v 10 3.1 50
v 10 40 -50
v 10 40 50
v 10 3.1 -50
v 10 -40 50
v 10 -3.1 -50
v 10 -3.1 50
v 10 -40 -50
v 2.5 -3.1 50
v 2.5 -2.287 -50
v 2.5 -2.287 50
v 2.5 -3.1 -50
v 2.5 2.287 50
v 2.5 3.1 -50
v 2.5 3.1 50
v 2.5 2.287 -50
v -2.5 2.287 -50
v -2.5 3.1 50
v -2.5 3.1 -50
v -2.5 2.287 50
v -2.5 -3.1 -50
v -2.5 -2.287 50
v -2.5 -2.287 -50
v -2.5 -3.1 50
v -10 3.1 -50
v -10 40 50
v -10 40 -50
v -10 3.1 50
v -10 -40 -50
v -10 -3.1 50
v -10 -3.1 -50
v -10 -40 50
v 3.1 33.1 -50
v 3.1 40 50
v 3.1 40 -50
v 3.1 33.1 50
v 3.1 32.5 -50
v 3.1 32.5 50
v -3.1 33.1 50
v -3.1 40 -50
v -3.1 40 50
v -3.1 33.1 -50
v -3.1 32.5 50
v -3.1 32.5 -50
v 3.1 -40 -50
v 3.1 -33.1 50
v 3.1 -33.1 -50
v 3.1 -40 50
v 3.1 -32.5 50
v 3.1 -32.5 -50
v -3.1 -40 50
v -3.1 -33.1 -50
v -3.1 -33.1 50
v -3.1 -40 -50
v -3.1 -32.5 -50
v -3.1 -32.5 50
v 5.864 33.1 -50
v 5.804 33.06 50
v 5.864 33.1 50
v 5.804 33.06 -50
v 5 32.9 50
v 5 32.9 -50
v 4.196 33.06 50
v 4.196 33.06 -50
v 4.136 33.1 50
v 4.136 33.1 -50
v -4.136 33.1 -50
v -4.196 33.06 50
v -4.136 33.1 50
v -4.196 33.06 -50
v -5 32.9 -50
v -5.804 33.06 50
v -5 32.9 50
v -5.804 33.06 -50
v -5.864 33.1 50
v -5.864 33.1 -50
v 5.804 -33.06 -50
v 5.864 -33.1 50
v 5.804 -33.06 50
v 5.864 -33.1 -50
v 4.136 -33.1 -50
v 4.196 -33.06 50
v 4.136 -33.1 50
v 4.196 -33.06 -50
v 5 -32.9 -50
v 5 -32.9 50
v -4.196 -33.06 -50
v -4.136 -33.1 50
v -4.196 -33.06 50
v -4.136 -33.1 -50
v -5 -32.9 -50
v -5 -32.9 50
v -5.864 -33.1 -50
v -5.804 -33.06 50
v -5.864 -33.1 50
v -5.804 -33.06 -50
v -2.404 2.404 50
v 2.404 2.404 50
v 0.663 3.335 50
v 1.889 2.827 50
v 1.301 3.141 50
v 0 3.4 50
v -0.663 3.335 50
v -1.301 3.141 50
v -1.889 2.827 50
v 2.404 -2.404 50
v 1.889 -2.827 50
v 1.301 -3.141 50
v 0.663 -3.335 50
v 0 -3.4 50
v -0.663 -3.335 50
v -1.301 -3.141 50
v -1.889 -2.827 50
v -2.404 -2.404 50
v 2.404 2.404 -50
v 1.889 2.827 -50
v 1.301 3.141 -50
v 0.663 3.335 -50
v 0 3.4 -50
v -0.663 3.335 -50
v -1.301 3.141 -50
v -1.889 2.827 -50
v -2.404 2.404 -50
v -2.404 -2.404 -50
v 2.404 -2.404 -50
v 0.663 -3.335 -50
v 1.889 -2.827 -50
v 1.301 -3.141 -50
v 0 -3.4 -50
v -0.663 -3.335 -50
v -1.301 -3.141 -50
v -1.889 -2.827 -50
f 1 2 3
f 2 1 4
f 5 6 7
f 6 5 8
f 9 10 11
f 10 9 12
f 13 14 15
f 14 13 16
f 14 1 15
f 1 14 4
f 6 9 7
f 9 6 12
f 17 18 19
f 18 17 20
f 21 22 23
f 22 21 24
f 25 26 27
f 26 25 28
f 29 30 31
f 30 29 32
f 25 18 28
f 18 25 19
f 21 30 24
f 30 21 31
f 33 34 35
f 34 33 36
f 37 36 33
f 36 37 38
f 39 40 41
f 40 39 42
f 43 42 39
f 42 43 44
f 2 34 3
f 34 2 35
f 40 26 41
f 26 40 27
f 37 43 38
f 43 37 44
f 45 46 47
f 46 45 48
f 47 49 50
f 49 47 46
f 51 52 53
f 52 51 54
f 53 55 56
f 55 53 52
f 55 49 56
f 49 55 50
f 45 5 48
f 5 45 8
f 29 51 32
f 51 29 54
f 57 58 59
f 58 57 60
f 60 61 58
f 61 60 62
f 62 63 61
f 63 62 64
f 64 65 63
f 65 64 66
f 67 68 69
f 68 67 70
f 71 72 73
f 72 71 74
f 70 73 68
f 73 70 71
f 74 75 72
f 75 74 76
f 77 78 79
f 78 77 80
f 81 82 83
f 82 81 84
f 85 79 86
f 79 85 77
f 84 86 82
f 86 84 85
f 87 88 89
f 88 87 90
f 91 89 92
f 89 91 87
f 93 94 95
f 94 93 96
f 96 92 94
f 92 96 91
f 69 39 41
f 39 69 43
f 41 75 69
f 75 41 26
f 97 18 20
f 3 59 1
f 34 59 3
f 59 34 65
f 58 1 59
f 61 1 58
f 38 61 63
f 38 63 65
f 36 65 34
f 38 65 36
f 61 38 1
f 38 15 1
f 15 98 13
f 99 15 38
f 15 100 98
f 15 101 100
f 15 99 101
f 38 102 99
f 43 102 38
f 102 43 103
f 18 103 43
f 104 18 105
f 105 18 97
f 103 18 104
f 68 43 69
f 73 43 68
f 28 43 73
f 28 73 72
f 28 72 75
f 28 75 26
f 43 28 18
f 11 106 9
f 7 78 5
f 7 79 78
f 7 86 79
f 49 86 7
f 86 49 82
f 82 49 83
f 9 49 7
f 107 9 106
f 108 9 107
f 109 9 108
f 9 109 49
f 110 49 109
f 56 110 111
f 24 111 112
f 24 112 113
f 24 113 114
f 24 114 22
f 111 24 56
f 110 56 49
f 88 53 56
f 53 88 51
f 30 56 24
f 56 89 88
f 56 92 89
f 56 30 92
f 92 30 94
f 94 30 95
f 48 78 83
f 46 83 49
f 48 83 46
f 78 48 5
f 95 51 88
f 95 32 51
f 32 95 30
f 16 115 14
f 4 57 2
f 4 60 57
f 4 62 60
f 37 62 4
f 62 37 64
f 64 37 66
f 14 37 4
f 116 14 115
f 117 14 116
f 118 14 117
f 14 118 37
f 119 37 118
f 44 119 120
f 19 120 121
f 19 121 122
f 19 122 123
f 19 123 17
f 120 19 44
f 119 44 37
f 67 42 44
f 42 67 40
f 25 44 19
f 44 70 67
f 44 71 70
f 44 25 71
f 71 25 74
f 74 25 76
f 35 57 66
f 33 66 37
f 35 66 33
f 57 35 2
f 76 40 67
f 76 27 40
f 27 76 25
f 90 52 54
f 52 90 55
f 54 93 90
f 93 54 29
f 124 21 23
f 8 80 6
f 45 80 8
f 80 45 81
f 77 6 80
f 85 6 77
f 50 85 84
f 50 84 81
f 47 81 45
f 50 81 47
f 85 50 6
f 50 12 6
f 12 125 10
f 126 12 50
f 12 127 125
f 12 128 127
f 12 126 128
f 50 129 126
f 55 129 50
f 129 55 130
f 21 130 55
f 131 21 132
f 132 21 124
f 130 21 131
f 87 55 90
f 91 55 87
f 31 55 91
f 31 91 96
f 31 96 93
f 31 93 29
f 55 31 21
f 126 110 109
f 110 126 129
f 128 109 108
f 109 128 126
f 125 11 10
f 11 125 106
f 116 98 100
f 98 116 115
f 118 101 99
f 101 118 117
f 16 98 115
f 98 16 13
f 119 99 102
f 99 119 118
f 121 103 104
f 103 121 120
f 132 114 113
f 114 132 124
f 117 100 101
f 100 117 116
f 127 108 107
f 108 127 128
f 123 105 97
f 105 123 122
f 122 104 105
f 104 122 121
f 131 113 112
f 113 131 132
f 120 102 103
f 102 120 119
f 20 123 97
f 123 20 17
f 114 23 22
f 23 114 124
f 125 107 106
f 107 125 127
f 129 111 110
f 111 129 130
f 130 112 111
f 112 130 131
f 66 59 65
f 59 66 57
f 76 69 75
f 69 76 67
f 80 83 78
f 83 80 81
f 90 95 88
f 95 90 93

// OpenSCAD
// Parameters
cross_section_width_mm = 20; //[10:40:1]
cross_section_height_mm = 80; //[40:160:1]
length_mm = 100; //[50:200:1]
centered_length = 1; //[0:1:1]
corner_hole_enabled = 1; //[0:1:1]
wall_thickness_mm = 2.2; //[1.2:4.4:0.1]
slot_opening_mm = 6.2; //[4:10:0.1]
slot_depth_mm = 6.5; //[3:12:0.1]
center_bore_diameter_mm = 6.8; //[3:14:0.1]
web_thickness_mm = 2.0; //[1.0:4.0:0.1]
corner_hole_diameter_mm = 4.2; //[2:8:0.1]
corner_hole_inset_mm = 5.0; //[3:10:0.1]
overlap_mm = 1.0; //[0.5:2.0:0.1]

// Extrusion - complete detailed geometry
module extrusion() {
  color("Silver") {
    difference() {
      // Main body
      cube([cross_section_width_mm, cross_section_height_mm, length_mm], center=true);
      
      // T-slot channels
      union() {
        translate([cross_section_width_mm/2 - (slot_depth_mm + overlap_mm)/2, 0, 0])
          cube([slot_depth_mm + overlap_mm, slot_opening_mm, length_mm + 2*overlap_mm], center=true);
        translate([-cross_section_width_mm/2 + (slot_depth_mm + overlap_mm)/2, 0, 0])
          cube([slot_depth_mm + overlap_mm, slot_opening_mm, length_mm + 2*overlap_mm], center=true);
        translate([0, cross_section_height_mm/2 - (slot_depth_mm + overlap_mm)/2, 0])
          cube([slot_opening_mm, slot_depth_mm + overlap_mm, length_mm + 2*overlap_mm], center=true);
        translate([0, -cross_section_height_mm/2 + (slot_depth_mm + overlap_mm)/2, 0])
          cube([slot_opening_mm, slot_depth_mm + overlap_mm, length_mm + 2*overlap_mm], center=true);
      }
      
      // Center bore
      translate([0, 0, 0])
        cylinder(r=center_bore_diameter_mm/2, h=length_mm + 2*overlap_mm, center=true, $fn=32);
      
      // Corner holes
      if (corner_hole_enabled) {
        union() {
          translate([cross_section_width_mm/2 - corner_hole_inset_mm, cross_section_height_mm/2 - corner_hole_inset_mm, 0])
            cylinder(r=corner_hole_diameter_mm/2, h=length_mm + 2*overlap_mm, center=true, $fn=16);
          translate([-cross_section_width_mm/2 + corner_hole_inset_mm, cross_section_height_mm/2 - corner_hole_inset_mm, 0])
            cylinder(r=corner_hole_diameter_mm/2, h=length_mm + 2*overlap_mm, center=true, $fn=16);
          translate([cross_section_width_mm/2 - corner_hole_inset_mm, -cross_section_height_mm/2 + corner_hole_inset_mm, 0])
            cylinder(r=corner_hole_diameter_mm/2, h=length_mm + 2*overlap_mm, center=true, $fn=16);
          translate([-cross_section_width_mm/2 + corner_hole_inset_mm, -cross_section_height_mm/2 + corner_hole_inset_mm, 0])
            cylinder(r=corner_hole_diameter_mm/2, h=length_mm + 2*overlap_mm, center=true, $fn=16);
        }
      }
    }
  }
}

// Extrusion Cross Section - detailed geometry
module extrusion_cross_section() {
  color("DimGray") {
    difference() {
      // Main body
      cube([cross_section_width_mm, cross_section_height_mm, length_mm], center=true);
      
      // T-slot channels
      union() {
        translate([cross_section_width_mm/2 - (slot_depth_mm + overlap_mm)/2, 0, 0])
          cube([slot_depth_mm + overlap_mm, slot_opening_mm, length_mm + 2*overlap_mm], center=true);
        translate([-cross_section_width_mm/2 + (slot_depth_mm + overlap_mm)/2, 0, 0])
          cube([slot_depth_mm + overlap_mm, slot_opening_mm, length_mm + 2*overlap_mm], center=true);
        translate([0, cross_section_height_mm/2 - (slot_depth_mm + overlap_mm)/2, 0])
          cube([slot_opening_mm, slot_depth_mm + overlap_mm, length_mm + 2*overlap_mm], center=true);
        translate([0, -cross_section_height_mm/2 + (slot_depth_mm + overlap_mm)/2, 0])
          cube([slot_opening_mm, slot_depth_mm + overlap_mm, length_mm + 2*overlap_mm], center=true);
      }
      
      // Center bore
      translate([0, 0, 0])
        cylinder(r=center_bore_diameter_mm/2, h=length_mm + 2*overlap_mm, center=true, $fn=32);
      
      // Corner holes
      if (corner_hole_enabled) {
        union() {
          translate([cross_section_width_mm/2 - corner_hole_inset_mm, cross_section_height_mm/2 - corner_hole_inset_mm, 0])
            cylinder(r=corner_hole_diameter_mm/2, h=length_mm + 2*overlap_mm, center=true, $fn=16);
          translate([-cross_section_width_mm/2 + corner_hole_inset_mm, cross_section_height_mm/2 - corner_hole_inset_mm, 0])
            cylinder(r=corner_hole_diameter_mm/2, h=length_mm + 2*overlap_mm, center=true, $fn=16);
          translate([cross_section_width_mm/2 - corner_hole_inset_mm, -cross_section_height_mm/2 + corner_hole_inset_mm, 0])
            cylinder(r=corner_hole_diameter_mm/2, h=length_mm + 2*overlap_mm, center=true, $fn=16);
          translate([-cross_section_width_mm/2 + corner_hole_inset_mm, -cross_section_height_mm/2 + corner_hole_inset_mm, 0])
            cylinder(r=corner_hole_diameter_mm/2, h=length_mm + 2*overlap_mm, center=true, $fn=16);
        }
      }
    }
  }
}

// Box Corner Profile Section - detailed geometry
module box_corner_profile_section() {
  color("Black") {
    cube([(cross_section_width_mm - slot_opening_mm)/2, (cross_section_width_mm - slot_opening_mm)/2, length_mm], center=true);
  }
}

// Box Corner Profile Sections - detailed geometry
module box_corner_profile_sections() {
  color("Black") {
    union() {
      translate([cross_section_width_mm/2 - ((cross_section_width_mm - slot_opening_mm)/2)/2, cross_section_height_mm/2 - ((cross_section_width_mm - slot_opening_mm)/2)/2, 0])
        box_corner_profile_section();
      translate([-cross_section_width_mm/2 + ((cross_section_width_mm - slot_opening_mm)/2)/2, cross_section_height_mm/2 - ((cross_section_width_mm - slot_opening_mm)/2)/2, 0])
        box_corner_profile_section();
      translate([cross_section_width_mm/2 - ((cross_section_width_mm - slot_opening_mm)/2)/2, -cross_section_height_mm/2 + ((cross_section_width_mm - slot_opening_mm)/2)/2, 0])
        box_corner_profile_section();
      translate([-cross_section_width_mm/2 + ((cross_section_width_mm - slot_opening_mm)/2)/2, -cross_section_height_mm/2 + ((cross_section_width_mm - slot_opening_mm)/2)/2, 0])
        box_corner_profile_section();
    }
  }
}

// Assembly
module assembly() {
  extrusion();
  extrusion_cross_section();
  box_corner_profile_sections();
}

assembly();
